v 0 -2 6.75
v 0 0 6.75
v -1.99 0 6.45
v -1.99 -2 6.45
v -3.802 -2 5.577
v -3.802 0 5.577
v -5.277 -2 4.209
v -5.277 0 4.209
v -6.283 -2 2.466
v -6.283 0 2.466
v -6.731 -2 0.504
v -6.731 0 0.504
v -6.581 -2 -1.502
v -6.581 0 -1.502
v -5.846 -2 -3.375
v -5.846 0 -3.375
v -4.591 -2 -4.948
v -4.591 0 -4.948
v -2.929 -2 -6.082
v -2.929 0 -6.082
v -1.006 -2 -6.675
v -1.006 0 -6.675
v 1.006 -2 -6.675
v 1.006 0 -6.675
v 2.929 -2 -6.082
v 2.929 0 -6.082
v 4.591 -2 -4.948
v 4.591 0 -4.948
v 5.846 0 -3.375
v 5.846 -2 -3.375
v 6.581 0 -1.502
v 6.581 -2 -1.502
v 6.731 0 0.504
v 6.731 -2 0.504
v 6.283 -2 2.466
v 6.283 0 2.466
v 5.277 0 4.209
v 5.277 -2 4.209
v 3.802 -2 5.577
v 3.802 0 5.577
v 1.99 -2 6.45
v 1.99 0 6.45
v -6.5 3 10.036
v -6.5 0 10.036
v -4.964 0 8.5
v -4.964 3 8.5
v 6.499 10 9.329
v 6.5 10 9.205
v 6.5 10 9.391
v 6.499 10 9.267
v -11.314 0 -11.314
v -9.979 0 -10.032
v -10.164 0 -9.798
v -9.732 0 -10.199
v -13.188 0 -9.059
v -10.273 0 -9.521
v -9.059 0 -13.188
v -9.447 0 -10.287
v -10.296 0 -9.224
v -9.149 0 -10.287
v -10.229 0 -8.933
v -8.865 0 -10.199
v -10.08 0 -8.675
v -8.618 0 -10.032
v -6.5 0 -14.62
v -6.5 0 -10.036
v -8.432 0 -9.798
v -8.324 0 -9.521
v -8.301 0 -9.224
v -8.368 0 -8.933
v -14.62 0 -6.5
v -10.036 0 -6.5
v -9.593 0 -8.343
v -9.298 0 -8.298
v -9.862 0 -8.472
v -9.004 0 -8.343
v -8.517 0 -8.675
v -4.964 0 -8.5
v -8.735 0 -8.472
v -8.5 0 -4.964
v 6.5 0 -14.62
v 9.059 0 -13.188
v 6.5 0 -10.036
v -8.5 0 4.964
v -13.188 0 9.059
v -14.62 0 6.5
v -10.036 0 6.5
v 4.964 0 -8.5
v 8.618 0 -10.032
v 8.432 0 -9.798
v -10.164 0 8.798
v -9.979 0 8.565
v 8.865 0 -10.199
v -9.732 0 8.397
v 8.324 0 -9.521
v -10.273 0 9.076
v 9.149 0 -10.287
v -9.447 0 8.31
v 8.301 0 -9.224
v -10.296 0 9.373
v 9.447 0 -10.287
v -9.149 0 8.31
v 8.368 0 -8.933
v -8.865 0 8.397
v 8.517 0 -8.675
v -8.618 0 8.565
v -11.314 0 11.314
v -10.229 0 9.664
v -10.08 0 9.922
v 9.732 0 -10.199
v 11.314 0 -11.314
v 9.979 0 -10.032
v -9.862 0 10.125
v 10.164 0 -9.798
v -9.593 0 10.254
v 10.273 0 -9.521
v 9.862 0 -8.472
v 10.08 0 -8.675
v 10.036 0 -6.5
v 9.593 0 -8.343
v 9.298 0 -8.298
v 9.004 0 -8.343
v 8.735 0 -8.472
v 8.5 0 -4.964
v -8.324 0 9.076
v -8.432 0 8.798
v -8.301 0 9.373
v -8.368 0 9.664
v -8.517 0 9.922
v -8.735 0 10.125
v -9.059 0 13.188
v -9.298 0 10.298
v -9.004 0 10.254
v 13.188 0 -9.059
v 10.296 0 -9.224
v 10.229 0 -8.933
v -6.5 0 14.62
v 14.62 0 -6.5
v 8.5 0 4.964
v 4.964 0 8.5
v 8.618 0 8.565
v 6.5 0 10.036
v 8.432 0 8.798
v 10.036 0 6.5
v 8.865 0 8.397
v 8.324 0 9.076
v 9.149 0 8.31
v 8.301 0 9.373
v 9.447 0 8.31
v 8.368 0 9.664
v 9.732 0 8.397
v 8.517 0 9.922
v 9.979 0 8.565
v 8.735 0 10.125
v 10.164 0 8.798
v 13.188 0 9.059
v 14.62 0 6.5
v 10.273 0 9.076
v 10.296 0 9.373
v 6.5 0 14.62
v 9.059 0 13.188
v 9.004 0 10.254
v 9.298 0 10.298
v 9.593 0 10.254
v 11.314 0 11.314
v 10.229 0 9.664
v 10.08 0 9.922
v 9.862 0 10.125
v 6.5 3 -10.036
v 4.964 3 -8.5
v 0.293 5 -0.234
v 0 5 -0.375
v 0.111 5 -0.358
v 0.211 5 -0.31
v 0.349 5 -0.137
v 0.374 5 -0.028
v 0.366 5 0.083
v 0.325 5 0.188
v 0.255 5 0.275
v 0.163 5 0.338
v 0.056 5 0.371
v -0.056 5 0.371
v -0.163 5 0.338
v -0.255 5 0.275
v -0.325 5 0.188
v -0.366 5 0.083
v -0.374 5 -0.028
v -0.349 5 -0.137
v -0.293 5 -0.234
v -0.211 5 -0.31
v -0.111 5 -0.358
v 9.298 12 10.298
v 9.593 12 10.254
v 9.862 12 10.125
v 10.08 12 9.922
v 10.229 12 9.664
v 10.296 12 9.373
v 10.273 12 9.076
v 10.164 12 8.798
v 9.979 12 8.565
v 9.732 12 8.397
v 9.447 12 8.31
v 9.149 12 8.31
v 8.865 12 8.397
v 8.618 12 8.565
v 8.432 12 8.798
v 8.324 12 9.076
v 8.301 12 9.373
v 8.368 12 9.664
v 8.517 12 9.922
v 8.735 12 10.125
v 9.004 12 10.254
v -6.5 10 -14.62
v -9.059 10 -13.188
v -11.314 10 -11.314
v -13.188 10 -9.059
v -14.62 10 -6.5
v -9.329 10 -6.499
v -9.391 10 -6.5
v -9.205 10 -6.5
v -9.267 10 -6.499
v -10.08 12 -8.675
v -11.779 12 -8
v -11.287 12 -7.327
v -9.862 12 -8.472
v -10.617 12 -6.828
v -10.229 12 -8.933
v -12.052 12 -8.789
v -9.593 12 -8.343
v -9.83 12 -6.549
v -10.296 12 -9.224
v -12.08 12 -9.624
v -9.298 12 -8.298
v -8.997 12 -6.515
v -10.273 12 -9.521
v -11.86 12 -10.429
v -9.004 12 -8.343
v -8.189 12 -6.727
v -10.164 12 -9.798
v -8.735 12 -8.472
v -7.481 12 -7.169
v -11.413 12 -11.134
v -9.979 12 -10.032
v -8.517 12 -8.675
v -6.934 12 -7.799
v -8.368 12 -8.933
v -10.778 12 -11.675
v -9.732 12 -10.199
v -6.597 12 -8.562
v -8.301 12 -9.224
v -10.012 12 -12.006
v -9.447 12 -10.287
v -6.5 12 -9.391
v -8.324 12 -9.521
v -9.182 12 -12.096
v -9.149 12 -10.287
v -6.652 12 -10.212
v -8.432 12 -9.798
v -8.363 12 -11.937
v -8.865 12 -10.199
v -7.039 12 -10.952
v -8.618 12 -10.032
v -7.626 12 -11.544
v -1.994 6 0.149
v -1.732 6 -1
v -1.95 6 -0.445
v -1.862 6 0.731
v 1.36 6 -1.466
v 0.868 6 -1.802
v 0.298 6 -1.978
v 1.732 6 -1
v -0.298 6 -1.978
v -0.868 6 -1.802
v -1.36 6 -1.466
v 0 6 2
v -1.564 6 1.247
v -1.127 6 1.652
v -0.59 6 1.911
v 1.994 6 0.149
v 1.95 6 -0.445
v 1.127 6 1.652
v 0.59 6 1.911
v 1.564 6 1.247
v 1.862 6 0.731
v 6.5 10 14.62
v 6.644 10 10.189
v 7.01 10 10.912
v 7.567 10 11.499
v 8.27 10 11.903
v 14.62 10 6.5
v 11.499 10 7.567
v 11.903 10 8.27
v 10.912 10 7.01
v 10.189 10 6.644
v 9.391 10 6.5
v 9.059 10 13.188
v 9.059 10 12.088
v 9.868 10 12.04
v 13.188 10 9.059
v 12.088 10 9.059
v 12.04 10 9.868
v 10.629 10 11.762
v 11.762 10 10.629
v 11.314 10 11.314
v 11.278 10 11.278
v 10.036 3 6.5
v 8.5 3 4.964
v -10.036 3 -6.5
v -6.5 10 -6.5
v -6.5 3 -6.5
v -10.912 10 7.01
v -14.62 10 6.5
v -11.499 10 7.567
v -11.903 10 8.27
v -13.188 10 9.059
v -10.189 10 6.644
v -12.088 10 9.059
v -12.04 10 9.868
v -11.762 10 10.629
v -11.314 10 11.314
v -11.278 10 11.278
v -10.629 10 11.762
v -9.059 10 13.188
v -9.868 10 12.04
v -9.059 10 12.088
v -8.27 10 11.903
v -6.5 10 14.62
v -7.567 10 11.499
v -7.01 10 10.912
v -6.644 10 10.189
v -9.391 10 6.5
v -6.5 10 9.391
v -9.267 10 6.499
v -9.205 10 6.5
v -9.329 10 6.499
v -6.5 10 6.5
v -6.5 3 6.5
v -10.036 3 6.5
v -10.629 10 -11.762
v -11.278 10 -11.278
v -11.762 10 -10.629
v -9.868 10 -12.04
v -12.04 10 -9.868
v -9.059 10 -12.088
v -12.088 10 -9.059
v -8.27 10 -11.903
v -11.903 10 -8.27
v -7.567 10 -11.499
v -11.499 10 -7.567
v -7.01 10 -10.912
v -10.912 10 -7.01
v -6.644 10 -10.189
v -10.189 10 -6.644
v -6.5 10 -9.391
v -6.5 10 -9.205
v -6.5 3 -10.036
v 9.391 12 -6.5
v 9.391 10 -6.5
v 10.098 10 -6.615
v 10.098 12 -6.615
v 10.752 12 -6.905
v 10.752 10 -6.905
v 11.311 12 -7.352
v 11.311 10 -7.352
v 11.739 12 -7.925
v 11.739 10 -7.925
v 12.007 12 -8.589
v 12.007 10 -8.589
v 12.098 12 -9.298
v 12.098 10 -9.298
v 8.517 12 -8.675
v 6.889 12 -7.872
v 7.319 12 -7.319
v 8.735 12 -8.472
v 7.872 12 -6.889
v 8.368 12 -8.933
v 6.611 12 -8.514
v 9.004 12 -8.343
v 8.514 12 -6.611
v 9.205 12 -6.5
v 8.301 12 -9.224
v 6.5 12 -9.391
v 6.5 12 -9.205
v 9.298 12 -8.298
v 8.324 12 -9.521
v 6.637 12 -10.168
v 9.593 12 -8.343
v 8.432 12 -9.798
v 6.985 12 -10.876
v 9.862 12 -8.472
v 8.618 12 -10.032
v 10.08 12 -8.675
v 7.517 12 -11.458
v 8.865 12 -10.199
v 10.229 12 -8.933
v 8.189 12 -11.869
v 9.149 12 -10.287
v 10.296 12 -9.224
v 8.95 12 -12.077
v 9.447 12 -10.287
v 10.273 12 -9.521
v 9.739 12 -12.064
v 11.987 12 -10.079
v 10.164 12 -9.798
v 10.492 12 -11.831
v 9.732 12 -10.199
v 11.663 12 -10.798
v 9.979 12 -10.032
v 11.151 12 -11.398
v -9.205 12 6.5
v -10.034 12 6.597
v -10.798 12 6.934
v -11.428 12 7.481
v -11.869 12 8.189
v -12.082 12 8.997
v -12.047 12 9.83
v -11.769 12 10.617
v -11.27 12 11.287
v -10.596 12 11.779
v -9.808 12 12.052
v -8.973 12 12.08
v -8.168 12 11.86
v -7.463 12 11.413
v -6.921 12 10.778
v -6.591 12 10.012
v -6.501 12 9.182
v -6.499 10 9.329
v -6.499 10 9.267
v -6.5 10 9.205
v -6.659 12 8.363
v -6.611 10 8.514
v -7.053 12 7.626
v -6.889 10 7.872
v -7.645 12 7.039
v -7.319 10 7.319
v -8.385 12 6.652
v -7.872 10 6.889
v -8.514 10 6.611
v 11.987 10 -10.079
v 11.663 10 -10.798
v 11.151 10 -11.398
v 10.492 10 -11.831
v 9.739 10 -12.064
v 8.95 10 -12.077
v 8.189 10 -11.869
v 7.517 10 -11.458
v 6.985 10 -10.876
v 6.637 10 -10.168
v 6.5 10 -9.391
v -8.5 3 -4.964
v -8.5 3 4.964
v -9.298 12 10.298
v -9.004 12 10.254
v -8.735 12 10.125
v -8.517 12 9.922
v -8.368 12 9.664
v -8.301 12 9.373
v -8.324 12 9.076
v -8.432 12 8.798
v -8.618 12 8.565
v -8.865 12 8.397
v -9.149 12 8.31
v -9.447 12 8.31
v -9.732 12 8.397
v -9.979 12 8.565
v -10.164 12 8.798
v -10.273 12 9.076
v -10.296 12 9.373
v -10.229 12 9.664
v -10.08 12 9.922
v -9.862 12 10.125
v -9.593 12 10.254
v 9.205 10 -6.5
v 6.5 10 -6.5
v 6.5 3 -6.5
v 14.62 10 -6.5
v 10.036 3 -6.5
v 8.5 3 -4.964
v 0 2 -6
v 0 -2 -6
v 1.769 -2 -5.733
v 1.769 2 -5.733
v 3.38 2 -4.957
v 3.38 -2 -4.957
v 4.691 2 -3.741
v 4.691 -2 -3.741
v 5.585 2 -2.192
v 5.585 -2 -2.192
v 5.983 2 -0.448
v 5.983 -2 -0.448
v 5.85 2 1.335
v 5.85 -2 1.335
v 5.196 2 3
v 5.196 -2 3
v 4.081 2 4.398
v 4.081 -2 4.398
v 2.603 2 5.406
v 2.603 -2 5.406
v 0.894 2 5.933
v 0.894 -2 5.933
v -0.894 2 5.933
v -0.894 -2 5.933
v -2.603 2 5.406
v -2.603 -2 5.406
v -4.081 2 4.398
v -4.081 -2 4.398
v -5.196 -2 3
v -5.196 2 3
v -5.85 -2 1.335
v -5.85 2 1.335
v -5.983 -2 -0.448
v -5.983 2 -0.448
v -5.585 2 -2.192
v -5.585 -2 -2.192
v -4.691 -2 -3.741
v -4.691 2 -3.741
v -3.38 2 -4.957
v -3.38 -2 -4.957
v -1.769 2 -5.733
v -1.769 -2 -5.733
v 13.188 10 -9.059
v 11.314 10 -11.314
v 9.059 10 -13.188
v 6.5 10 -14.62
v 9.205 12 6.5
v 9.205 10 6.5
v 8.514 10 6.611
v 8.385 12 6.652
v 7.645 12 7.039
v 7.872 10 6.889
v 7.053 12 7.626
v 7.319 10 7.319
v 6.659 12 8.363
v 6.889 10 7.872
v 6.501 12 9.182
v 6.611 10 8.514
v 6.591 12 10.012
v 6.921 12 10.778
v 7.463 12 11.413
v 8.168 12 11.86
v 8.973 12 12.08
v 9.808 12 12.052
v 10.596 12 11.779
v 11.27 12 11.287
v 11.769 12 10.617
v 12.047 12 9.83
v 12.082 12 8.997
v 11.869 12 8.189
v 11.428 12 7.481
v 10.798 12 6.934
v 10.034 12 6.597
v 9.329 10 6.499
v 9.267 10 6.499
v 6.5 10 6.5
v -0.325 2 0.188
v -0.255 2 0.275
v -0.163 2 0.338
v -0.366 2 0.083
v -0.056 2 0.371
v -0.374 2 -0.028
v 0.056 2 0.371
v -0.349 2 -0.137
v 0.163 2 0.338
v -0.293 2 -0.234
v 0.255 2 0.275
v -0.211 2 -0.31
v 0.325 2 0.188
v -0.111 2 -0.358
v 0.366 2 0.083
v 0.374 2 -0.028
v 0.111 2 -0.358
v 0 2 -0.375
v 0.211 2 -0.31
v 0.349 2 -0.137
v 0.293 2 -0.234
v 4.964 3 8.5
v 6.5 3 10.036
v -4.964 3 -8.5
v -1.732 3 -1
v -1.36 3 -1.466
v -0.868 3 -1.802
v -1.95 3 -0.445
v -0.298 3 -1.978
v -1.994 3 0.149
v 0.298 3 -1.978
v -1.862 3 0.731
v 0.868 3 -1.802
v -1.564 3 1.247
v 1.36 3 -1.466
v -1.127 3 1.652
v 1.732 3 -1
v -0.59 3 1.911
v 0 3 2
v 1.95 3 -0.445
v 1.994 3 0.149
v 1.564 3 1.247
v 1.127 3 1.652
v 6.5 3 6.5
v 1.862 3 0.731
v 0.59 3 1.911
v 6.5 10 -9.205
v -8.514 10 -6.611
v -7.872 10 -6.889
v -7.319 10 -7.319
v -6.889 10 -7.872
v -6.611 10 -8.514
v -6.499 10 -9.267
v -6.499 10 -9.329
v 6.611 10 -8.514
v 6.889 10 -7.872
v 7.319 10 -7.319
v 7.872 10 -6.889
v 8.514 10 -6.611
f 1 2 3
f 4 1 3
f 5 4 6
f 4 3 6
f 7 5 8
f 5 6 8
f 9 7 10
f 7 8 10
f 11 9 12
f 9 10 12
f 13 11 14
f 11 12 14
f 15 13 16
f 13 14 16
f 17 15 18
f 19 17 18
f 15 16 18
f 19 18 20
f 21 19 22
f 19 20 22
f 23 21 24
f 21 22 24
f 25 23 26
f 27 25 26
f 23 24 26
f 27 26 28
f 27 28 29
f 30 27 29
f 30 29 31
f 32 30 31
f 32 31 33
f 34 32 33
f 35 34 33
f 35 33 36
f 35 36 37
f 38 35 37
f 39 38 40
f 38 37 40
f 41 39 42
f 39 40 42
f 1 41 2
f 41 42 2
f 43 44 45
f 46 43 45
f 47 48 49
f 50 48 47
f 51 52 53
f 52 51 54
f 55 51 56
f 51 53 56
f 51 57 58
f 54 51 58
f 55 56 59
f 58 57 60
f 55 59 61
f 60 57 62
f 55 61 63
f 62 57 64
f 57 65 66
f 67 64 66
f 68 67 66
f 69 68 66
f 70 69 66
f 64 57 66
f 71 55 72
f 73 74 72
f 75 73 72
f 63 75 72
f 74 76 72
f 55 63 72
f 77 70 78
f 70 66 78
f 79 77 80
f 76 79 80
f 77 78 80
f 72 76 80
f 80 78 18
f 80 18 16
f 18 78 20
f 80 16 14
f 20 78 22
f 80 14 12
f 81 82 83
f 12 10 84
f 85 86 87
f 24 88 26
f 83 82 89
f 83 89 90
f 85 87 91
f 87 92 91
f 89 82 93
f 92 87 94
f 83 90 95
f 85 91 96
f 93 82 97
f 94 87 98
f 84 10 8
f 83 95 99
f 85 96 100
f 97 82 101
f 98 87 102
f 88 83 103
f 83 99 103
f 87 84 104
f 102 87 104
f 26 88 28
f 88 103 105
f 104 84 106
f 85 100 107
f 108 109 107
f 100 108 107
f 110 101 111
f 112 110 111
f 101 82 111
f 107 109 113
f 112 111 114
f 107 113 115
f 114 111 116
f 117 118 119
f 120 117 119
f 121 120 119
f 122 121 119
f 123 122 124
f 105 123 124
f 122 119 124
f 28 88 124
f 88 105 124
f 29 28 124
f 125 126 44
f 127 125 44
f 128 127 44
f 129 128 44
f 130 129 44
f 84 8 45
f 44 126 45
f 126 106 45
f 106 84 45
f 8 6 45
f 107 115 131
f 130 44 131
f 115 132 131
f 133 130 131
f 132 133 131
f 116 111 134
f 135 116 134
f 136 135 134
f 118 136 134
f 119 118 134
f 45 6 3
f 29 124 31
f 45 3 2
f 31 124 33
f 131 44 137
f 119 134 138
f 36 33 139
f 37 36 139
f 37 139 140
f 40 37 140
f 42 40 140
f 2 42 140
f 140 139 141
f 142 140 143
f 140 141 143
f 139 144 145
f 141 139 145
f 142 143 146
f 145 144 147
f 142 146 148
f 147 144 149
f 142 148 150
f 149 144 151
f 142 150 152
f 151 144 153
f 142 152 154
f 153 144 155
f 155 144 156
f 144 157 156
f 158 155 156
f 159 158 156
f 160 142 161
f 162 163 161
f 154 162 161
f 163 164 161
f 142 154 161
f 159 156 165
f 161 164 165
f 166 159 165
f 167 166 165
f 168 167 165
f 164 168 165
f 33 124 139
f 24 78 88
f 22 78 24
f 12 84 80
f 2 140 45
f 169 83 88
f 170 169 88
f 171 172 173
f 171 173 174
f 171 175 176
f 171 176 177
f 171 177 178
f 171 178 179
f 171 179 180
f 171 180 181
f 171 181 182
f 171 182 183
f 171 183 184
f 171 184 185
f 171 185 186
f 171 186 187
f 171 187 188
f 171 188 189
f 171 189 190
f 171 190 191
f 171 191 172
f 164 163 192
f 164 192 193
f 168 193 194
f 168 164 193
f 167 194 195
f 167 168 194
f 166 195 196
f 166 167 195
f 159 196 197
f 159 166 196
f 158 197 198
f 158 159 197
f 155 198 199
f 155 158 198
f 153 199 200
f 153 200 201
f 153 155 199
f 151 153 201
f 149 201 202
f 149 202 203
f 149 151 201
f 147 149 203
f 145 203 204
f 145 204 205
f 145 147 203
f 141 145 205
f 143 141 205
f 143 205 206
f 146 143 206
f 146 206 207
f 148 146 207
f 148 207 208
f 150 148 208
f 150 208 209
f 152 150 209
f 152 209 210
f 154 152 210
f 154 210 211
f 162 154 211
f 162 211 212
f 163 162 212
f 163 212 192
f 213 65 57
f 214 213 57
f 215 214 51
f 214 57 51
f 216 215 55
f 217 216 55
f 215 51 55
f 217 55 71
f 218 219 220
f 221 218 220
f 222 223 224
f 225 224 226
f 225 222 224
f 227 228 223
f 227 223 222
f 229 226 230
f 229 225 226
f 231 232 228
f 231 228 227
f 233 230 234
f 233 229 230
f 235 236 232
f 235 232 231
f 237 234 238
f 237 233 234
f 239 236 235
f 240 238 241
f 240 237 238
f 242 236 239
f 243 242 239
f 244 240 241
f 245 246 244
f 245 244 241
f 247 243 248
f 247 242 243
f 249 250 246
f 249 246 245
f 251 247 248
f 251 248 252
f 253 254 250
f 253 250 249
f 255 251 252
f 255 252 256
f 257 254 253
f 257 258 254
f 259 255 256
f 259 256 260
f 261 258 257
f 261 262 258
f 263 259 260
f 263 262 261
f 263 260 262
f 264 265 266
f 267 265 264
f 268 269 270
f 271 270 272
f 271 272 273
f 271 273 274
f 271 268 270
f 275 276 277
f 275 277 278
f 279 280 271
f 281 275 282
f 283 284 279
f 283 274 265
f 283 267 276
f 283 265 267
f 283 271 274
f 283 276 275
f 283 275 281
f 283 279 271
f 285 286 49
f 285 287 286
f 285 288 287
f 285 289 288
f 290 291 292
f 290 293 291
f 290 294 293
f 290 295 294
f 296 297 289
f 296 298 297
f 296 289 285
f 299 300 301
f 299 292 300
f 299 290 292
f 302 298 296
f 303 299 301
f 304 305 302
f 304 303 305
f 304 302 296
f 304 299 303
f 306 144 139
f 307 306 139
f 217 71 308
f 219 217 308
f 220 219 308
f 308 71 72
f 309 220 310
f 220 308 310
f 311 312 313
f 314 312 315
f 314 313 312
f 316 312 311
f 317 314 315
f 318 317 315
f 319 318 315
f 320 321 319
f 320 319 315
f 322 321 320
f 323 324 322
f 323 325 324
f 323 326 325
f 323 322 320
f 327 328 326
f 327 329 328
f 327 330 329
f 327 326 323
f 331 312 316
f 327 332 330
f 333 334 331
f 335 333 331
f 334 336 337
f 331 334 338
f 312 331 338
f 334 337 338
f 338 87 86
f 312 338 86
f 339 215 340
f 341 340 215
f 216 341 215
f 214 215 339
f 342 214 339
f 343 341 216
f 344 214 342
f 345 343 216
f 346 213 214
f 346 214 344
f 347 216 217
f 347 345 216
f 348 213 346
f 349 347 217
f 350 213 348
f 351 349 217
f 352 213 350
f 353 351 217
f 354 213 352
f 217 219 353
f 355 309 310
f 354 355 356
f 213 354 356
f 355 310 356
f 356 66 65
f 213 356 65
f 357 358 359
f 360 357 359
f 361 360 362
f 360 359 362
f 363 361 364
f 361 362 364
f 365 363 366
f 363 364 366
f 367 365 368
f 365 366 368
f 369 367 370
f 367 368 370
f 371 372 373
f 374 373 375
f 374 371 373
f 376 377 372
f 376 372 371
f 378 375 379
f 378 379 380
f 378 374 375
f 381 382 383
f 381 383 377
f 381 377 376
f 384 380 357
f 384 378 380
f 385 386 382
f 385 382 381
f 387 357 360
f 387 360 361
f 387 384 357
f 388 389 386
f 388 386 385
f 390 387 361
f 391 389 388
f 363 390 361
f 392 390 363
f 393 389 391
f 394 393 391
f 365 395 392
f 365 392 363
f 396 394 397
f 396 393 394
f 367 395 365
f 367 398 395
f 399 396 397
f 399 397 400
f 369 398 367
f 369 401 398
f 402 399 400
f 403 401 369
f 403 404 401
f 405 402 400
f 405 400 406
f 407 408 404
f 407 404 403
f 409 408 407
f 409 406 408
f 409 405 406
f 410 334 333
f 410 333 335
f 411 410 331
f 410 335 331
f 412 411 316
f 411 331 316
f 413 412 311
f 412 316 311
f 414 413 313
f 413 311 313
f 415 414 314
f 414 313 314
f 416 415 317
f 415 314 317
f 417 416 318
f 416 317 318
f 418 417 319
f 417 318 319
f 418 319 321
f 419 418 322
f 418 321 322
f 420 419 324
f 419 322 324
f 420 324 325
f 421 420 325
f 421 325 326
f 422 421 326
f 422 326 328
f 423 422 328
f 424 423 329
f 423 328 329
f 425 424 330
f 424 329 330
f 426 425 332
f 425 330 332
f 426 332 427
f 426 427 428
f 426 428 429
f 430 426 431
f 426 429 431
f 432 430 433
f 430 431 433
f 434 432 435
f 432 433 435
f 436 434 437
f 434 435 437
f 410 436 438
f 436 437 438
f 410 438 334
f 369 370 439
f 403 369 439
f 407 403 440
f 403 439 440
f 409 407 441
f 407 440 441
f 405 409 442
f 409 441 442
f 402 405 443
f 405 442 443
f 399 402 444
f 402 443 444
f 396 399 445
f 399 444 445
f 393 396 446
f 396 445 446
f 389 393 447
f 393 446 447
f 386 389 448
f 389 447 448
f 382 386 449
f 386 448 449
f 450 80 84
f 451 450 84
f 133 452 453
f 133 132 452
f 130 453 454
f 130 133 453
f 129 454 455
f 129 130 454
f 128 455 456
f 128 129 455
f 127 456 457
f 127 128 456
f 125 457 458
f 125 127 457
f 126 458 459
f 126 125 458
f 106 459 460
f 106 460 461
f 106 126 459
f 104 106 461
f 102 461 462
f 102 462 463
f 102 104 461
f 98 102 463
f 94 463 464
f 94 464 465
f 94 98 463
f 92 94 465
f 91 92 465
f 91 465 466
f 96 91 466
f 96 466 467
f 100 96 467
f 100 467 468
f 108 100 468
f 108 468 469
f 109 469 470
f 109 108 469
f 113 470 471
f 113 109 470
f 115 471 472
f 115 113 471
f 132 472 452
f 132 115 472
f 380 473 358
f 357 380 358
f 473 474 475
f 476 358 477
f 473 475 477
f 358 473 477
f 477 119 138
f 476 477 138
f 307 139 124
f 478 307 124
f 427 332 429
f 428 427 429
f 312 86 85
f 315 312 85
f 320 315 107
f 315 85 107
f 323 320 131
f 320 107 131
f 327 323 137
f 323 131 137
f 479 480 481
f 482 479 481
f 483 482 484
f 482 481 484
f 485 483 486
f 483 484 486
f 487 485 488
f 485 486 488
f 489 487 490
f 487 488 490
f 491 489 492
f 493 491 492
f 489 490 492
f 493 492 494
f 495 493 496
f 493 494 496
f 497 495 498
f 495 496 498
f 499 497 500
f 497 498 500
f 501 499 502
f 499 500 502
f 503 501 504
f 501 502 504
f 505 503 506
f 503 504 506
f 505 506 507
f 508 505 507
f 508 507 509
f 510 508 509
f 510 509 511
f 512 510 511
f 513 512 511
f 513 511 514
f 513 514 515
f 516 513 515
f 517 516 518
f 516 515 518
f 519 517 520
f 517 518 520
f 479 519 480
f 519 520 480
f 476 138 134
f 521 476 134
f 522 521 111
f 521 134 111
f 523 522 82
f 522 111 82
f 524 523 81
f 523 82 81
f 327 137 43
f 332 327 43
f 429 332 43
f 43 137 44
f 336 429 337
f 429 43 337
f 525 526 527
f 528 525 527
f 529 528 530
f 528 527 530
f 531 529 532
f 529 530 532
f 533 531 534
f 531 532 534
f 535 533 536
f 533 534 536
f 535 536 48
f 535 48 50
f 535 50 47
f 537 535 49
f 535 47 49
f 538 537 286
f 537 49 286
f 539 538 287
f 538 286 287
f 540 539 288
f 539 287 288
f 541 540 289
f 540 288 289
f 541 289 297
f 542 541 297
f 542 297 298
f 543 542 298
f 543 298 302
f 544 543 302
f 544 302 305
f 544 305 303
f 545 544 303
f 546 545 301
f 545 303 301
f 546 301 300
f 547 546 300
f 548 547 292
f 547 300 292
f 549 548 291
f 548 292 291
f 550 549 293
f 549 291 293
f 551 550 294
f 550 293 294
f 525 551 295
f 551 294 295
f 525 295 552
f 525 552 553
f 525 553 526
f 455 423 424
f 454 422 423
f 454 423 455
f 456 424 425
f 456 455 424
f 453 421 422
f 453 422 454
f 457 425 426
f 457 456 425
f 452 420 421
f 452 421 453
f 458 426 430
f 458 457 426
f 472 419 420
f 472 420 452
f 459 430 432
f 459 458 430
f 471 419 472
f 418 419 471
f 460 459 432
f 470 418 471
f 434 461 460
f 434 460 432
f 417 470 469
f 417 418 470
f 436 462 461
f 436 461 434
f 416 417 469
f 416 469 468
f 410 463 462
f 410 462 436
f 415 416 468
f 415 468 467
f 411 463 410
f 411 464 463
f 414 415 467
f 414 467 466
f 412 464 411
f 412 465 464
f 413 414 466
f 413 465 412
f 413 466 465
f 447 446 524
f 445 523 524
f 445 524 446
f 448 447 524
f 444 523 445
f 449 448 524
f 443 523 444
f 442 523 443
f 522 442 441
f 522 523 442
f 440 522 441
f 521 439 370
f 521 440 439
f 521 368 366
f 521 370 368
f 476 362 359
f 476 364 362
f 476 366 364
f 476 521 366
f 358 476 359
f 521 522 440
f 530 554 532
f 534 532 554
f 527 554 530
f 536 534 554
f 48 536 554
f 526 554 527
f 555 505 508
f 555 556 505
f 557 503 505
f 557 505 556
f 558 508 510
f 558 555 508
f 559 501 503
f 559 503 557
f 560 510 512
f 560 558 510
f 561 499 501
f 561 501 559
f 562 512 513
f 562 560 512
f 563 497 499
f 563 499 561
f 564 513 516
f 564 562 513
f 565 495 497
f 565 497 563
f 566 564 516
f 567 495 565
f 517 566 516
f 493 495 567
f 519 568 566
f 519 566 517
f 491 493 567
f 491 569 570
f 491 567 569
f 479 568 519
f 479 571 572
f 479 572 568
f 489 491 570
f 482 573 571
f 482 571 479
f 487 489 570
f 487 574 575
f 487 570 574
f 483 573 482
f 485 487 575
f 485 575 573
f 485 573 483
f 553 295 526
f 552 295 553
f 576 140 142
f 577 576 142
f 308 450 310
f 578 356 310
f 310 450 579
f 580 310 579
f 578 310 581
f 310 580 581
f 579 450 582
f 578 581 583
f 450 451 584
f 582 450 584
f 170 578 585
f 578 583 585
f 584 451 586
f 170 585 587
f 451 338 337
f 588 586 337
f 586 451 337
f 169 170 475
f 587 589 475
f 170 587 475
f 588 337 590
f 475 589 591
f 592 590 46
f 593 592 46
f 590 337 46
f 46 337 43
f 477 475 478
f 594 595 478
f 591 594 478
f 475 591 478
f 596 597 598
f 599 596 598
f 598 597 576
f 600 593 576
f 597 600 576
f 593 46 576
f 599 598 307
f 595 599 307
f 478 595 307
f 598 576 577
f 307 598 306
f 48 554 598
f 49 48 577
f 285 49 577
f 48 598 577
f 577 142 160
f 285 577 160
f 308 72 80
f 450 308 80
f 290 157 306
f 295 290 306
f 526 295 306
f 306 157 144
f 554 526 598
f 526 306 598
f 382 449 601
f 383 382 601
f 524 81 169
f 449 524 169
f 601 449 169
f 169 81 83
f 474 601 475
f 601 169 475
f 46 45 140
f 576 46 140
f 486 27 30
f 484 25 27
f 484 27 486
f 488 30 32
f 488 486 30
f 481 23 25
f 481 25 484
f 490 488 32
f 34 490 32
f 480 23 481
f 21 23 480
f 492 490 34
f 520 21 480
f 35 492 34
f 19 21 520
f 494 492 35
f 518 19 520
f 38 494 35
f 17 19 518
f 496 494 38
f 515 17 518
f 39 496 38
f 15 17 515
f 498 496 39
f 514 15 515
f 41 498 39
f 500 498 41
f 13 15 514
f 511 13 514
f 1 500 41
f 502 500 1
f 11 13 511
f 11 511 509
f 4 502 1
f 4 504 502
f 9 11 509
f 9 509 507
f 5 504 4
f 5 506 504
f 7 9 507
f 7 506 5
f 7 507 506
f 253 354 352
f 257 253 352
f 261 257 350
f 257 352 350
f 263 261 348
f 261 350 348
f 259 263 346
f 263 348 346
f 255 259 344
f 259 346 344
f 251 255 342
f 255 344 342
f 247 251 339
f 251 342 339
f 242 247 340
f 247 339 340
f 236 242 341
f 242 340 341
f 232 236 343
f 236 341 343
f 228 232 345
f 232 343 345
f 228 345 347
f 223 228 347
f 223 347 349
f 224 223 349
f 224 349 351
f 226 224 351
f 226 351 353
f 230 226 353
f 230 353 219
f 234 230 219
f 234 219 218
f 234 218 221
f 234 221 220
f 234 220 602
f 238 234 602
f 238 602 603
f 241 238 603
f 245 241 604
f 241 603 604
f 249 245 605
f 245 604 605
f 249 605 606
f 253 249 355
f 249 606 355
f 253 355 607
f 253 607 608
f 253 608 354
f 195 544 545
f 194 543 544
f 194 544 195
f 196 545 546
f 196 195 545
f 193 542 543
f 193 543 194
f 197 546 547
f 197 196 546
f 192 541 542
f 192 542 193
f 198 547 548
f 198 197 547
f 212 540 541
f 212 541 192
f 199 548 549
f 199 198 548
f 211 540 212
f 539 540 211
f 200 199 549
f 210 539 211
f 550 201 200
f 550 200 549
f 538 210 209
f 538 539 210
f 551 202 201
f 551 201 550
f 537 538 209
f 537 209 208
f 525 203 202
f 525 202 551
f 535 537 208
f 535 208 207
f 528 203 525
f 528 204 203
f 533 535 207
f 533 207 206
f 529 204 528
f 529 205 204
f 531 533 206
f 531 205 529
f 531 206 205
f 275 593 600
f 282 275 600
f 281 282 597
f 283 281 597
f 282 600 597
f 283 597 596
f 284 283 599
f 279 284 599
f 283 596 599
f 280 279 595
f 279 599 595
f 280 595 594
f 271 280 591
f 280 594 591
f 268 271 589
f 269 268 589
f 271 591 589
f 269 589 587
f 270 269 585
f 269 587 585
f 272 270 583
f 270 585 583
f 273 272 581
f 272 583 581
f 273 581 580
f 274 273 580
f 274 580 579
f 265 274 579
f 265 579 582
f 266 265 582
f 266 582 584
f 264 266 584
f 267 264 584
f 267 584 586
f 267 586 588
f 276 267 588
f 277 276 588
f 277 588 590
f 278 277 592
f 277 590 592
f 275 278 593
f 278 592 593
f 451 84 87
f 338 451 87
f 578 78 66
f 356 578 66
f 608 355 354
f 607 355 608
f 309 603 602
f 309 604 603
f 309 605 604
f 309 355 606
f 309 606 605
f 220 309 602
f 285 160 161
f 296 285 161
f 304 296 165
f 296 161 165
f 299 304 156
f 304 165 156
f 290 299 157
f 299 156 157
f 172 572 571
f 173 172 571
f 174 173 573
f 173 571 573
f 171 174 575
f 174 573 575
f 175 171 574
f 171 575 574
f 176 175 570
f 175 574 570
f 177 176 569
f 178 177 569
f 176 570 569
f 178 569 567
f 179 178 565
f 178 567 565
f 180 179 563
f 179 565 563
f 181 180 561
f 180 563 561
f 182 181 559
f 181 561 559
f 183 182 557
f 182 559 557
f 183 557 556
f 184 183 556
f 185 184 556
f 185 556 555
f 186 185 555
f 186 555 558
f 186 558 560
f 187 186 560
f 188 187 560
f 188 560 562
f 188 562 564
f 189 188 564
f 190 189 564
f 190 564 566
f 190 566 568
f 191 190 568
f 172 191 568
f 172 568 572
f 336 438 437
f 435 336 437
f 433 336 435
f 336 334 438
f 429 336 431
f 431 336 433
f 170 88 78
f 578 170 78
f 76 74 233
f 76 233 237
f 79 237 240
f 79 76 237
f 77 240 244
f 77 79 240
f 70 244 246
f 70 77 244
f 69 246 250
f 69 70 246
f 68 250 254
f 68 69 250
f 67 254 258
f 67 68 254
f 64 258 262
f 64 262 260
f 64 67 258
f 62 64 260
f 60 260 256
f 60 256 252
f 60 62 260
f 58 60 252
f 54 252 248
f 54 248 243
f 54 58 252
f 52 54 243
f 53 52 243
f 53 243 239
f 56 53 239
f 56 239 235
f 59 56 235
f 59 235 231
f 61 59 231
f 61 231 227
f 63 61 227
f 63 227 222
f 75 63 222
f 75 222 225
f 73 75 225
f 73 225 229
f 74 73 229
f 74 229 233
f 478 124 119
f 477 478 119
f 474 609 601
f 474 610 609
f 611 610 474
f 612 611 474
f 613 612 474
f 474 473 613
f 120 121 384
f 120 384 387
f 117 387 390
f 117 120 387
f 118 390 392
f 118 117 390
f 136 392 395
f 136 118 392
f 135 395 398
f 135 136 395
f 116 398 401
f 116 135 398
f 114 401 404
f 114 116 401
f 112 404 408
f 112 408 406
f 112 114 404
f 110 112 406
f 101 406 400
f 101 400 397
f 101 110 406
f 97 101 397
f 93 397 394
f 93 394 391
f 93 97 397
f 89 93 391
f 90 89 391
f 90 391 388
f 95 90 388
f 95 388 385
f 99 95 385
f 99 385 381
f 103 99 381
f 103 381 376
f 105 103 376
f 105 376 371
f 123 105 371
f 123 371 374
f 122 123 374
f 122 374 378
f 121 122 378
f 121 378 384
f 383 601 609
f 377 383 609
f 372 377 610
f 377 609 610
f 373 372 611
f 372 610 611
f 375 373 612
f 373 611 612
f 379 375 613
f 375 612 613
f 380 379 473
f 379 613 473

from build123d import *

# Parameters (mm, degrees)
CROQUIS1_R                 = 16
SALIENTE_EXTRUIR1_DEPTH    = 10
CORTAR_EXTRUIR2_DEPTH      = 10
CORTAR_EXTRUIR4_DEPTH      = 7
CORTAR_EXTRUIR4_DEPTH_BACK = 10
CORTAR_EXTRUIR4_START      = -10
CROQUIS5_R                 = 2
SALIENTE_EXTRUIR2_DEPTH    = 3
CROQUIS6_R                 = 2.8
CROQUIS6_R_2               = 1
SALIENTE_EXTRUIR4_DEPTH    = 2
CORTAR_EXTRUIR5_START      = -12
CROQUIS9_R                 = 1
CORTAR_EXTRUIR5_DEPTH      = 12
CROQUIS10_R                = 6.75
SALIENTE_EXTRUIR5_DEPTH    = 2
CROQUIS11_R                = 6
CORTAR_EXTRUIR6_DEPTH      = 4
CROQUIS12_R                = 0.375
CORTAR_EXTRUIR7_DEPTH      = 7


with BuildPart() as part:
    # Croquis1 → Saliente-Extruir1 (new body)
    with BuildSketch(Plane(origin=(0, 0, 0), x_dir=(1, 0, 0), z_dir=(0, 1, 0))):
        with Locations(Location((0, 0, 0), (0, 0, 270))):
            Circle(CROQUIS1_R)
    extrude(amount=SALIENTE_EXTRUIR1_DEPTH)

    # Croquis2 → Cortar-Extruir2 (cut)
    with BuildSketch(Plane(origin=(0, 0, 0), x_dir=(-1, 0, 0), z_dir=(0, -1, 0))):
        with BuildLine():
            ThreePointArc((-6.5, -14.620191518), (0, -16), (6.5, -14.620191517))
            Line((6.5, -14.620191517), (6.5, -10.035533906))
            Line((6.5, -10.035533906), (4.964466094, -8.5))
            Line((4.964466094, -8.5), (-4.964466094, -8.5))
            Line((-4.964466094, -8.5), (-6.5, -10.035533906))
            Line((-6.5, -10.035533906), (-6.5, -14.620191517))
        make_face()
        with BuildLine():
            Line((-4.964466094, 8.5), (4.964466094, 8.5))
            Line((4.964466094, 8.5), (6.5, 10.035533906))
            Line((6.5, 10.035533906), (6.5, 14.620191517))
            ThreePointArc((6.5, 14.620191518), (0, 16.000000001), (-6.5, 14.620191518))
            Line((-6.5, 14.620191517), (-6.5, 10.035533906))
            Line((-6.5, 10.035533906), (-4.964466094, 8.5))
        make_face()
        with BuildLine():
            Line((10.035533906, -6.5), (14.620191517, -6.5))
            ThreePointArc((14.620191515, -6.499999999), (15.651246979, -3.322418977), (15.999999994, 0))
            ThreePointArc((16, 0), (15.651246984, 3.322418978), (14.620191517, 6.5))
            Line((14.620191517, 6.5), (10.035533906, 6.5))
            Line((10.035533906, 6.5), (8.5, 4.964466094))
            Line((8.5, 4.964466094), (8.5, -4.964466094))
            Line((8.5, -4.964466094), (10.035533906, -6.5))
        make_face()
        with BuildLine():
            ThreePointArc((-14.620191518, 6.5), (-16.000000001, 0), (-14.620191518, -6.5))
            Line((-14.620191517, -6.5), (-10.035533906, -6.5))
            Line((-10.035533906, -6.5), (-8.5, -4.964466094))
            Line((-8.5, -4.964466094), (-8.5, 4.964466094))
            Line((-8.5, 4.964466094), (-10.035533906, 6.5))
            Line((-10.035533906, 6.5), (-14.620191517, 6.5))
        make_face()
    extrude(amount=-CORTAR_EXTRUIR2_DEPTH, mode=Mode.SUBTRACT)

    # Croquis4 → Cortar-Extruir4 (cut, two sides: drawn at the far end of the back side and taken through both)
    with BuildSketch(Plane.XZ.offset(CORTAR_EXTRUIR4_START - CORTAR_EXTRUIR4_DEPTH_BACK)):
        Polygon((-6.5, 16.599431938), (-6.5, 6.5), (-19.32076002, 6.5), (-19.32076002, -6.5), (-6.5, -6.5), (-6.5, -17.296221808), (6.5, -17.296221808), (6.5, -6.5), (20.964302933, -6.5), (20.964302933, 6.5), (6.5, 6.5), (6.5, 16.599431938), align=None)
    extrude(amount=CORTAR_EXTRUIR4_DEPTH + CORTAR_EXTRUIR4_DEPTH_BACK, mode=Mode.SUBTRACT)

    # Croquis5 → Saliente-Extruir2 (add)
    with BuildSketch(Plane(origin=(0, 3, 0), x_dir=(1, 0, 0), z_dir=(0, 1, 0))):
        with Locations(Location((0, 0, 0), (0, 0, 270))):
            Circle(CROQUIS5_R)
    extrude(amount=SALIENTE_EXTRUIR2_DEPTH)

    # Croquis6 → Saliente-Extruir4 (add)
    # profile 1 of 4: a face of its own
    with BuildSketch(Plane(origin=(0, 10, 0), x_dir=(1, 0, 0), z_dir=(0, 1, 0))):
        with Locations(Location((-9.298454173, -9.298454173, 0), (0, 0, 88.096034402))):
            Circle(CROQUIS6_R)
        with Locations(Location((-9.298454173, -9.298454173, 0), (0, 0, 270))):
            Circle(CROQUIS6_R_2, mode=Mode.SUBTRACT)
    # profile 2 of 4: a face of its own
    with BuildSketch(Plane(origin=(0, 10, 0), x_dir=(1, 0, 0), z_dir=(0, 1, 0))):
        with Locations(Location((-9.298454173, 9.298454173, 0), (0, 0, 1.903965598))):
            Circle(CROQUIS6_R)
        with Locations(Location((-9.298454173, 9.298454173, 0), (0, 0, 270))):
            Circle(CROQUIS6_R_2, mode=Mode.SUBTRACT)
    # profile 3 of 4: a face of its own
    with BuildSketch(Plane(origin=(0, 10, 0), x_dir=(1, 0, 0), z_dir=(0, 1, 0))):
        with BuildLine():
            ThreePointArc((9.391482361, 6.5), (11.310974847, 7.351723442), (12.098454173, 9.298454173))
            ThreePointArc((12.098454173, 9.298454173), (9.344974688, 12.098067689), (6.5, 9.391482361))
            Line((6.5, 9.391482361), (6.5, 9.205425984))
            ThreePointArc((6.5, 9.205425984), (7.318555185, 7.318555185), (9.205425984, 6.5))
            Line((9.205425984, 6.5), (9.391482361, 6.5))
        make_face()
        with Locations(Location((9.298454173, 9.298454173, 0), (0, 0, 270))):
            Circle(CROQUIS6_R_2, mode=Mode.SUBTRACT)
    # profile 4 of 4: a face of its own
    with BuildSketch(Plane(origin=(0, 10, 0), x_dir=(1, 0, 0), z_dir=(0, 1, 0))):
        with Locations(Location((9.298454173, -9.298454173, 0), (0, 0, 91.903965598))):
            Circle(CROQUIS6_R)
        with Locations(Location((9.298454173, -9.298454173, 0), (0, 0, 270))):
            Circle(CROQUIS6_R_2, mode=Mode.SUBTRACT)
    extrude(amount=SALIENTE_EXTRUIR4_DEPTH)

    # Croquis9 → Cortar-Extruir5 (cut)
    with BuildSketch(Plane(origin=(0, 10, 0), x_dir=(1, 0, 0), z_dir=(0, 1, 0)).offset(CORTAR_EXTRUIR5_START)):
        with Locations(Location((-9.298454173, 9.298454173, 0), (0, 0, 270))):
            Circle(CROQUIS9_R)
        with Locations(Location((9.298454173, 9.298454173, 0), (0, 0, 270))):
            Circle(CROQUIS9_R)
        with Locations(Location((9.298454173, -9.298454173, 0), (0, 0, 270))):
            Circle(CROQUIS9_R)
        with Locations(Location((-9.298454173, -9.298454173, 0), (0, 0, 270))):
            Circle(CROQUIS9_R)
    extrude(amount=CORTAR_EXTRUIR5_DEPTH, mode=Mode.SUBTRACT)

    # Croquis10 → Saliente-Extruir5 (add)
    with BuildSketch(Plane.XZ):
        with Locations(Location((0, 0, 0), (0, 0, 90))):
            Circle(CROQUIS10_R)
    extrude(amount=SALIENTE_EXTRUIR5_DEPTH)

    # Croquis11 → Cortar-Extruir6 (cut)
    with BuildSketch(Plane.XZ.offset(2)):
        with Locations(Location((0, 0, 0), (0, 0, 270))):
            Circle(CROQUIS11_R)
    extrude(amount=-CORTAR_EXTRUIR6_DEPTH, mode=Mode.SUBTRACT)

    # Croquis12 → Cortar-Extruir7 (cut)
    with BuildSketch(Plane.XZ.offset(2)):
        with Locations(Location((0, 0, 0), (0, 0, 270))):
            Circle(CROQUIS12_R)
    extrude(amount=-CORTAR_EXTRUIR7_DEPTH, mode=Mode.SUBTRACT)


solid = part.part
